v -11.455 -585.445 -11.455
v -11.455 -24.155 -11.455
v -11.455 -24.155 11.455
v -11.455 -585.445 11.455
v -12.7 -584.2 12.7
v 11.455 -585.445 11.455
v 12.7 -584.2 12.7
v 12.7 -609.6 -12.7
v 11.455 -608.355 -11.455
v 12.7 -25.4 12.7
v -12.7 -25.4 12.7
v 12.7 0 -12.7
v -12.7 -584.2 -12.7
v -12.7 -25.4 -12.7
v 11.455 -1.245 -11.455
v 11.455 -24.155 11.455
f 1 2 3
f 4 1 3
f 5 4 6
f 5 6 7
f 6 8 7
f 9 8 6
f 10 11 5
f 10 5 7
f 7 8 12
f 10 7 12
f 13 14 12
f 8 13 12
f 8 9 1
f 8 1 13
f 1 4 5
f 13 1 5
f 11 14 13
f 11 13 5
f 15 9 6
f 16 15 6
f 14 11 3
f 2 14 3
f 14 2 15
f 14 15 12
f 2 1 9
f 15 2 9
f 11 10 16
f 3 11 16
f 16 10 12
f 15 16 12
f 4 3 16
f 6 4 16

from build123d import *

# Parameters (mm, degrees)
F0_W     = 25.4
F0_H     = 25.4
F0_W_2   = 22.9108
F0_H_2   = 22.9108
F1_DEPTH = 609.6
F3_DEPTH = 25.401
F5_DEPTH = 25.401


with BuildPart() as f1:
    # F0 (on Front) → F1 (new body)
    with BuildSketch(Plane.XZ):
        Rectangle(F0_W, F0_H)
        Rectangle(F0_W_2, F0_H_2, mode=Mode.SUBTRACT)
    extrude(amount=F1_DEPTH)

    # F2 (on face) → F3 (cut, through all)
    with BuildSketch(Plane.XY.offset(12.7)):
        Polygon((-12.7, -25.4), (12.7, 0), (-12.7, 0), align=None)
        Polygon((-12.7, -609.6), (12.7, -609.6), (-12.7, -584.2), align=None)
    extrude(amount=-F3_DEPTH, mode=Mode.SUBTRACT)

    # F4 (on face) → F5 (cut, through all)
    with BuildSketch(Plane.YZ.offset(12.7)):
        Polygon((-609.6, 12.7), (-609.6, -12.7), (-584.2, 12.7), align=None)
        Polygon((-25.4, 12.7), (0, -12.7), (0, 12.7), align=None)
    extrude(amount=-F5_DEPTH, mode=Mode.SUBTRACT)


solid = f1.part
